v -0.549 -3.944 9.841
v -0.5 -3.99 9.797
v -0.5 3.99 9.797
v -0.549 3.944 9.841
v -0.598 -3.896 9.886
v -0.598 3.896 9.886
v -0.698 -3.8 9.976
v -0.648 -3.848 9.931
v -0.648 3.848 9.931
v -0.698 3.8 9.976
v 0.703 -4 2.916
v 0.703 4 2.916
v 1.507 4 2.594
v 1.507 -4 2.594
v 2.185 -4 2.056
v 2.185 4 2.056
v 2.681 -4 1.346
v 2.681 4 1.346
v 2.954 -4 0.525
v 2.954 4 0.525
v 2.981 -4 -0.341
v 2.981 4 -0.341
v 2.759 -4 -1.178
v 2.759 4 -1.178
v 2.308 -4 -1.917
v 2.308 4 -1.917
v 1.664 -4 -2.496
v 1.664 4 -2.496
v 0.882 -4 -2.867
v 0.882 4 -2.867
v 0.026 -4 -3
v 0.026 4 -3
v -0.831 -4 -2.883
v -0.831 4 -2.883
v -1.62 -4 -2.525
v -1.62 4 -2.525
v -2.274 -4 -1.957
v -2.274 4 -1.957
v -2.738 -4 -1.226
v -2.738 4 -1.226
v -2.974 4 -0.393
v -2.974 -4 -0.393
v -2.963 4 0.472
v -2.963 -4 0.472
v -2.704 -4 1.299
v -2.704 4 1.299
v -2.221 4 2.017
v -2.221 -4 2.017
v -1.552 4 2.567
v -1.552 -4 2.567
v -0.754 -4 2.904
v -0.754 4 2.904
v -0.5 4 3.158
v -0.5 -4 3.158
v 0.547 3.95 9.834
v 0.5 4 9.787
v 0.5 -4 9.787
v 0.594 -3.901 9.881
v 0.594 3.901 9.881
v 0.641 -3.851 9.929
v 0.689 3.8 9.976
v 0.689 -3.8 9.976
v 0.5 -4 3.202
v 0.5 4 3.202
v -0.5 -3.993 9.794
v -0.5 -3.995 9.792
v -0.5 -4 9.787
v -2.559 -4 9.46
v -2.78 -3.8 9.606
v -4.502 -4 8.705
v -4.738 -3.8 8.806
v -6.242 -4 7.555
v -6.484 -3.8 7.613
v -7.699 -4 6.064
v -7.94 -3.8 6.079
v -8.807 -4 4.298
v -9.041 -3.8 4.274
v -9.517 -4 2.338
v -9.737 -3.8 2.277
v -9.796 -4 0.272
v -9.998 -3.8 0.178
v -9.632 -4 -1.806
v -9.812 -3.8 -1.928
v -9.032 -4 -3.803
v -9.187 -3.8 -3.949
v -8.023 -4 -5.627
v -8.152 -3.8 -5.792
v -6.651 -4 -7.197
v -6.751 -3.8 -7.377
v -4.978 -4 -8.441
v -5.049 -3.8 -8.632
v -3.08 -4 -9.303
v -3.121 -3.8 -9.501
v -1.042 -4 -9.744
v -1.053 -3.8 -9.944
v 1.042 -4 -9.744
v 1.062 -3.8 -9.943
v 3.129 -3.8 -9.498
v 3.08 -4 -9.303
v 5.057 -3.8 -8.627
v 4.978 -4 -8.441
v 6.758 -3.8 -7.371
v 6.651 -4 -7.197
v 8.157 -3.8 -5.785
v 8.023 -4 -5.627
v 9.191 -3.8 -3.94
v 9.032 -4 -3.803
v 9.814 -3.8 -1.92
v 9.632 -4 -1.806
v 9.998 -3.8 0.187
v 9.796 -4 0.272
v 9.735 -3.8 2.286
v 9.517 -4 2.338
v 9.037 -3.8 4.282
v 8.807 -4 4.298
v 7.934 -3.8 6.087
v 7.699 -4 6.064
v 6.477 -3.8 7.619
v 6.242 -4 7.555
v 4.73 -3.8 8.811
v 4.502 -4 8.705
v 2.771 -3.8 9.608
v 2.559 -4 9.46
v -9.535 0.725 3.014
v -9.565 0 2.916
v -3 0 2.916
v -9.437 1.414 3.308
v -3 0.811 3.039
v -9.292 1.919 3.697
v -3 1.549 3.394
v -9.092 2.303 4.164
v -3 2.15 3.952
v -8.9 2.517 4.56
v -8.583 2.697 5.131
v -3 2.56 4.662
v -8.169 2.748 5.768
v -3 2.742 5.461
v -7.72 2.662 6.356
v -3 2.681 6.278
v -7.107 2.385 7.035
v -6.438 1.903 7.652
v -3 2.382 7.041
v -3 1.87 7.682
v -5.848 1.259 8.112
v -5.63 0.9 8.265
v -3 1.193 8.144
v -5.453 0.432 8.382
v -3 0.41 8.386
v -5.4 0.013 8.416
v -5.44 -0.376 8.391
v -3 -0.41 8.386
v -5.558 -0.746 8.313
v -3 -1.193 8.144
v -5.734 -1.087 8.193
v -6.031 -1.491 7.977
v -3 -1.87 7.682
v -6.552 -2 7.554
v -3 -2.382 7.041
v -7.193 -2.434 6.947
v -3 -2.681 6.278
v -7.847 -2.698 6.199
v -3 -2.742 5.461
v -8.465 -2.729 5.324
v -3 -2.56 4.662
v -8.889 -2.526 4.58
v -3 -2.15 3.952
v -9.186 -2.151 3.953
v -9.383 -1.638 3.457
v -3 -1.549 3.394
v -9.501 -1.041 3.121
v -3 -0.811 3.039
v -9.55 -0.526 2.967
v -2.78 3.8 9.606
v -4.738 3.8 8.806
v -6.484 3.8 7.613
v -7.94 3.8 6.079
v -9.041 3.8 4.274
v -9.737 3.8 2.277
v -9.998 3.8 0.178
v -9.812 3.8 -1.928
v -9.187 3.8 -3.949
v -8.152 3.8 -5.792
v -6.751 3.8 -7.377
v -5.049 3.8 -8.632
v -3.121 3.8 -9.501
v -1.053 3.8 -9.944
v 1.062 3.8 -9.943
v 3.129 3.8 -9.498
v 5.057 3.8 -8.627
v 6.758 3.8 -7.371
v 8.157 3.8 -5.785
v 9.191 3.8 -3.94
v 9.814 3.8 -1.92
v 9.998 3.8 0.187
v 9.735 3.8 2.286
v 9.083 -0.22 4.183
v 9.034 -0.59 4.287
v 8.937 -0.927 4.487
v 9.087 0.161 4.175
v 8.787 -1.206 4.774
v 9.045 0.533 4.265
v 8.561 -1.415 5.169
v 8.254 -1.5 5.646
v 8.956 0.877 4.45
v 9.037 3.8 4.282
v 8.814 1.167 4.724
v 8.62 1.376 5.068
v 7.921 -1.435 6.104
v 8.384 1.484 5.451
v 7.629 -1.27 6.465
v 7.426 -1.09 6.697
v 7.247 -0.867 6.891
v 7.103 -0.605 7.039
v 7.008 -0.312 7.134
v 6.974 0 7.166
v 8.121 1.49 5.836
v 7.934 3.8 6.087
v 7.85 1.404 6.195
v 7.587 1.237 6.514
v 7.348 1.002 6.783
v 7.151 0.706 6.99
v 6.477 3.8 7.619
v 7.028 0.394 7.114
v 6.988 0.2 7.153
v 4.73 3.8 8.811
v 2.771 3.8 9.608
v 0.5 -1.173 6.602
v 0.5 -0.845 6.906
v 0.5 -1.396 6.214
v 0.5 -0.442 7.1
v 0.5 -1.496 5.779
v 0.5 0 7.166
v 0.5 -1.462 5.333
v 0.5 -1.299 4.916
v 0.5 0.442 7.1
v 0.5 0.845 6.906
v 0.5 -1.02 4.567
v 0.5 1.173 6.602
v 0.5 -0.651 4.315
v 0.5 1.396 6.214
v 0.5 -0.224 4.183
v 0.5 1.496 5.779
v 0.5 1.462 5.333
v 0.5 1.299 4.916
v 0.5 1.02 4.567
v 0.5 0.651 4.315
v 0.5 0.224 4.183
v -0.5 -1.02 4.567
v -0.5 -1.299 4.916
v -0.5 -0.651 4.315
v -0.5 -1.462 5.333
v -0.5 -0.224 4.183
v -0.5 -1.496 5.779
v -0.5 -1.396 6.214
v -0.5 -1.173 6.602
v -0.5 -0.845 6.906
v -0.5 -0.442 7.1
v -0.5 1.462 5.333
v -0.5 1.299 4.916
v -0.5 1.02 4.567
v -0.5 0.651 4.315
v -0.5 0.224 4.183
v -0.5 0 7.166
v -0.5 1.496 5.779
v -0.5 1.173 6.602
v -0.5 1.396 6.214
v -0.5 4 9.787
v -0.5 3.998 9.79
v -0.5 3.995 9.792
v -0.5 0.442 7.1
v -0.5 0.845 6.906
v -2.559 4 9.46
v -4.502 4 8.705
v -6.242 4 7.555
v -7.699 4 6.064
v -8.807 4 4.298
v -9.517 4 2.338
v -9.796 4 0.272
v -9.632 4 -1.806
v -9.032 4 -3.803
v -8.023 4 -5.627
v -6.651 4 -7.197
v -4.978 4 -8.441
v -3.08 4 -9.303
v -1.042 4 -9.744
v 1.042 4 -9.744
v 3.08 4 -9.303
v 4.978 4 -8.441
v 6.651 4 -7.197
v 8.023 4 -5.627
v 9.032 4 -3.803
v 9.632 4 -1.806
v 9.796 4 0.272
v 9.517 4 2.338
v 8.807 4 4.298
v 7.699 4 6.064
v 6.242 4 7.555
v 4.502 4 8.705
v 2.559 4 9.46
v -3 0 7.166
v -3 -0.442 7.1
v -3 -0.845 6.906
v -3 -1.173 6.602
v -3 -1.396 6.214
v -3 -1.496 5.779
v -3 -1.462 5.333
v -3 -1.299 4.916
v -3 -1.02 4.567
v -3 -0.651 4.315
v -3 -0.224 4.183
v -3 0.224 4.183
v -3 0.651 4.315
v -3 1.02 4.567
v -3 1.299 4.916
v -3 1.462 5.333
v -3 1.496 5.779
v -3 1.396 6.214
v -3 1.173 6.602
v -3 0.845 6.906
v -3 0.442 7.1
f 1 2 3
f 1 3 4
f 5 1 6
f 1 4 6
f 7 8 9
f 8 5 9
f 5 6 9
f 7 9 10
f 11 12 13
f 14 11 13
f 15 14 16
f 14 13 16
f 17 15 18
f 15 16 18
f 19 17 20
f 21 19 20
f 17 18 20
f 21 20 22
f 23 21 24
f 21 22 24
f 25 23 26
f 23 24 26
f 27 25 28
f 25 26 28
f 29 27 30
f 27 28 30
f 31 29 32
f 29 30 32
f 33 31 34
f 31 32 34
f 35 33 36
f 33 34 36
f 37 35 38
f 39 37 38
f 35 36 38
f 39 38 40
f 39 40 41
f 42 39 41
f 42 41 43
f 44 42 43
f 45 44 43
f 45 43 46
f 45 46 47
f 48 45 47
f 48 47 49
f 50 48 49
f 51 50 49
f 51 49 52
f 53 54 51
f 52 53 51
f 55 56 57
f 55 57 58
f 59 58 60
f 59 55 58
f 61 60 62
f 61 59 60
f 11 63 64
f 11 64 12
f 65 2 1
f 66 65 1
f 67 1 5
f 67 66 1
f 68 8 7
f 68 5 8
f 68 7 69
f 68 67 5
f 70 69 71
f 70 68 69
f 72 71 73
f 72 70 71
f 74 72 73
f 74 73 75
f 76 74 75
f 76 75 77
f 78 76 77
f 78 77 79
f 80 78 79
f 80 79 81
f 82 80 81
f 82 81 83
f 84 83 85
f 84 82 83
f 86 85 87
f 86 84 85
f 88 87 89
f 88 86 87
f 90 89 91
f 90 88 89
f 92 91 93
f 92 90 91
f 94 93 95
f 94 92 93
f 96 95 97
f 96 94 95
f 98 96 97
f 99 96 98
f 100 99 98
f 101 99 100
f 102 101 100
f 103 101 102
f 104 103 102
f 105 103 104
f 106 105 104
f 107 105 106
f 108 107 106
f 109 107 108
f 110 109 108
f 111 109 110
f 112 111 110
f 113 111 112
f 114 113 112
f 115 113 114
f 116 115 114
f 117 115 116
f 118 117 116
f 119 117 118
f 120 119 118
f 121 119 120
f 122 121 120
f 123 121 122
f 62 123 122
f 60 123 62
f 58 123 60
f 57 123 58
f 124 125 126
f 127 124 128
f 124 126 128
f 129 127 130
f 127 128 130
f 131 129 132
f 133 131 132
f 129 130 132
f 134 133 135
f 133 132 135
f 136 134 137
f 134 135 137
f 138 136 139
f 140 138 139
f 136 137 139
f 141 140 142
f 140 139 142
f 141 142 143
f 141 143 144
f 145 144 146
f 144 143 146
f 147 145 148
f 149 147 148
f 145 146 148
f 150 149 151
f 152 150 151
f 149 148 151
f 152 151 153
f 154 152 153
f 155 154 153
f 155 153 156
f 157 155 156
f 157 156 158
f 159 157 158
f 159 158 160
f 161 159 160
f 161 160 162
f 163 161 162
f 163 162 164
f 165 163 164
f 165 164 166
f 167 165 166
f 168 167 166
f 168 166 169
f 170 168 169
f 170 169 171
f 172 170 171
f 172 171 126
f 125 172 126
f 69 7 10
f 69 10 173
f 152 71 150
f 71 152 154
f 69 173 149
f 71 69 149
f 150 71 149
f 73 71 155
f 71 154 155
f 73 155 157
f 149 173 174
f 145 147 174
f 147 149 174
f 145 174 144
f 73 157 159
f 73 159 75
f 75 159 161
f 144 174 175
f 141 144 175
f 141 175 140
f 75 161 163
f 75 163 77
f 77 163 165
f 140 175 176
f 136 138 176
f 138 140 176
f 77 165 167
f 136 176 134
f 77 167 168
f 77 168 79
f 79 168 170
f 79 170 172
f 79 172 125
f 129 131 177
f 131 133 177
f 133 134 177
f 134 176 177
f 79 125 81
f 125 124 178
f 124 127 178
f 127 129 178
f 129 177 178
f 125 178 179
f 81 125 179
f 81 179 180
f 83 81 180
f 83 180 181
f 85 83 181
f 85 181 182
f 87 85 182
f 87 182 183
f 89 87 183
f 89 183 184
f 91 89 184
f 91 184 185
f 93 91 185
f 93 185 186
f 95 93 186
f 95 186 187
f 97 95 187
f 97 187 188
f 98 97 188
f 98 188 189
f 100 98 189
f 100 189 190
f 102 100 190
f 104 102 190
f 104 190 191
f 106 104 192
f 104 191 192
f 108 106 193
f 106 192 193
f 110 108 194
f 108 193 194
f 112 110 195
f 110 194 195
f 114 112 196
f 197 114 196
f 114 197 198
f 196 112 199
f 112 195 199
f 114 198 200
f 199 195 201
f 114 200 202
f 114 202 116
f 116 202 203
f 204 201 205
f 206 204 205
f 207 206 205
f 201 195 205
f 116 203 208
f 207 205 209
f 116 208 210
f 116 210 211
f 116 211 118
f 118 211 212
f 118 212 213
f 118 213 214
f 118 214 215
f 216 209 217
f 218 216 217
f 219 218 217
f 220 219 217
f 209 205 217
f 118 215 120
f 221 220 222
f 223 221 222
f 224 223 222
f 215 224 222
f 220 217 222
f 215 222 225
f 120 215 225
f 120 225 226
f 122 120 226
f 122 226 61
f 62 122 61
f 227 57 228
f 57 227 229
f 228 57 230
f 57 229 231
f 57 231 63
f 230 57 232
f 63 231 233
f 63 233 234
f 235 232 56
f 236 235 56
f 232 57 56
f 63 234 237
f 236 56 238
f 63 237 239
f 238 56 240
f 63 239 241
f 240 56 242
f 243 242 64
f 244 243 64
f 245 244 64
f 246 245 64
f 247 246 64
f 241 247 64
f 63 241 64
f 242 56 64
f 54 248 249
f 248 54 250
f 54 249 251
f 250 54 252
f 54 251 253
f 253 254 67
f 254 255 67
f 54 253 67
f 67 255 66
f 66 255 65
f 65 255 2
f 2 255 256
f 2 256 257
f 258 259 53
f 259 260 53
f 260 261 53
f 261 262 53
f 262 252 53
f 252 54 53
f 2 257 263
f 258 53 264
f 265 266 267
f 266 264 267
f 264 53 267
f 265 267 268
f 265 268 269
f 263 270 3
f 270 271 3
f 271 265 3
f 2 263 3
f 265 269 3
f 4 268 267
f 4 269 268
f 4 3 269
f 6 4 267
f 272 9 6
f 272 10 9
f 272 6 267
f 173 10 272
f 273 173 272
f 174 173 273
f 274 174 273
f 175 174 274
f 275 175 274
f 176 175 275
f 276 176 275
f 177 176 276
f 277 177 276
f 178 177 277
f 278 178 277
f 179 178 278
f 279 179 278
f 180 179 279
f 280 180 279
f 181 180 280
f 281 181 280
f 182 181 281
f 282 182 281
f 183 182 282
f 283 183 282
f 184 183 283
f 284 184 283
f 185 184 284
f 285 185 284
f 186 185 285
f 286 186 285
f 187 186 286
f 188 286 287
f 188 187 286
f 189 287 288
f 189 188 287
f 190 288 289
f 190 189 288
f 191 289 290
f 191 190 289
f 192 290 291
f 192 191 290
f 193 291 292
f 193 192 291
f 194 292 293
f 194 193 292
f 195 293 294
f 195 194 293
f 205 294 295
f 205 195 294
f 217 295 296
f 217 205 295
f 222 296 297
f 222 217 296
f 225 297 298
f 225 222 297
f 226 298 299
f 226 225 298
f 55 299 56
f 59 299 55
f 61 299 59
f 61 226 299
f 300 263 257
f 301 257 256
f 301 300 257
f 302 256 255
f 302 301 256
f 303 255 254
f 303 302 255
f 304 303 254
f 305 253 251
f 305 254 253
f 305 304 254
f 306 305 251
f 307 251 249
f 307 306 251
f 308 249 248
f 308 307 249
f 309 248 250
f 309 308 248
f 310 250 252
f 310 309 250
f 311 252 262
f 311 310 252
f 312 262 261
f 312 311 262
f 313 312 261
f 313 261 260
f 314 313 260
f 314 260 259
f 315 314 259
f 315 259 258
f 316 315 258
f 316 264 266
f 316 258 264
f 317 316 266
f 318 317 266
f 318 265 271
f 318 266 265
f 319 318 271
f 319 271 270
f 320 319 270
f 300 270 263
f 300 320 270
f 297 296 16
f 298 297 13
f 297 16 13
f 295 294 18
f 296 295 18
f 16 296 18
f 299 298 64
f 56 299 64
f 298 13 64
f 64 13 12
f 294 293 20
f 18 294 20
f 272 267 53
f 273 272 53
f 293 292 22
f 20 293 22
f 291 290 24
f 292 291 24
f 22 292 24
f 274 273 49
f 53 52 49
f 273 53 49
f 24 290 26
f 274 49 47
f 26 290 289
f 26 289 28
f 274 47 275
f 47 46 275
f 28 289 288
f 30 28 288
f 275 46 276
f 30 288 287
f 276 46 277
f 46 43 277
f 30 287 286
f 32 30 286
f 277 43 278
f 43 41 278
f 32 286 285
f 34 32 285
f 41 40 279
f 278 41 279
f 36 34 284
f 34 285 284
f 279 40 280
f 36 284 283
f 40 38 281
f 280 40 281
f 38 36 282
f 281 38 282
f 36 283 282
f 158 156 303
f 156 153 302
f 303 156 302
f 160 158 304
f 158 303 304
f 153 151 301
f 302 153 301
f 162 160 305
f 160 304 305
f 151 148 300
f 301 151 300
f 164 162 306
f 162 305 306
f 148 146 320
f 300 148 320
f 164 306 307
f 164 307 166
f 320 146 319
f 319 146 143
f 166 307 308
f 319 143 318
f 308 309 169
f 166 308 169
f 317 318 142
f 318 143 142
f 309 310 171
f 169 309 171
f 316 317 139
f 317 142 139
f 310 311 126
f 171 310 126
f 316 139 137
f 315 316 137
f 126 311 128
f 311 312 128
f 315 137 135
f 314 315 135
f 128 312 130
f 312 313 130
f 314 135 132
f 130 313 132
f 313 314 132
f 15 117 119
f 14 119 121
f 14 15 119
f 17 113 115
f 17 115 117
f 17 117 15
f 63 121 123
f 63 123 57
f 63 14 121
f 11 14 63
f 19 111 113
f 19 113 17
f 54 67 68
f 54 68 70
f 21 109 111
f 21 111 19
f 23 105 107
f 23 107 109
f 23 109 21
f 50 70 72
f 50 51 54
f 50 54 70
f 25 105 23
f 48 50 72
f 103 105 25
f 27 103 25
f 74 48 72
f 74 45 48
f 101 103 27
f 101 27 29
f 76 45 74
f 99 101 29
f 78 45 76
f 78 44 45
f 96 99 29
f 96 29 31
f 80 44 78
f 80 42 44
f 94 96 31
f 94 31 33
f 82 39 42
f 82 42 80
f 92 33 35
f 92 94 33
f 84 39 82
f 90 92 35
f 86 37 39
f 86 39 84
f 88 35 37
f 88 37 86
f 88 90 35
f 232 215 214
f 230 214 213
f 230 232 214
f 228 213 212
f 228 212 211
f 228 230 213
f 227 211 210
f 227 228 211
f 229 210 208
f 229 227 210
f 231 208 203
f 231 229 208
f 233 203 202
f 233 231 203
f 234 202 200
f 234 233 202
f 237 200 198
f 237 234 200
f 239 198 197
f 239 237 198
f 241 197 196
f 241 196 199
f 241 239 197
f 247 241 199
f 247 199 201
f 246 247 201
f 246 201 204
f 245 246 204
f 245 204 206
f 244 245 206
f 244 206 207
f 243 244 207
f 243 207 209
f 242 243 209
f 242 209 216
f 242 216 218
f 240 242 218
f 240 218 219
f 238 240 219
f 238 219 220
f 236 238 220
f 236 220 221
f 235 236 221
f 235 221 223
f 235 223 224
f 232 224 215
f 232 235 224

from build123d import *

# Parameters (mm, degrees)
EXTRUDE_1_DEPTH     = 4
CHAMFER_1_SIZE      = 0.2
CHAMFER_1_SIZE_2    = 0.19070336
CHAMFER_1_SIZE_3    = 0.244096934
SKETCH_2_R          = 2.75
CUT_EXTRUDE_1_DEPTH = 17.881943016
SKETCH_3_R          = 1.5
CUT_EXTRUDE_2_DEPTH = 17.881943152


with BuildPart() as part:
    # 草图1 → 凸台-拉伸1 (new, symmetric)
    with BuildSketch(Plane(origin=(0, 0, 0), x_dir=(1, 0, 0), z_dir=(0, 1, 0))):
        with BuildLine():
            Line((-0.5, -2.958039892), (-0.5, -9.987492178))
            ThreePointArc((-0.5, -9.987492178), (0, 10), (0.5, -9.987492178))
            Line((0.5, -9.987492178), (0.5, -2.958039892))
            ThreePointArc((0.5, -2.958039892), (0, 3), (-0.5, -2.958039892))
        make_face()
    extrude(amount=EXTRUDE_1_DEPTH, both=True)

    # 倒角1
    # the kernel refuses this chamfer: 0.244096934, 0.2, 0.19070336 mm, written as the material it takes off along each edge
    with BuildSketch(Plane(origin=(0, 4, 0), x_dir=(-0.0031415874858795653, 0, 0.9999950652018581), z_dir=(0.9999950652018581, 0, 0.0031415874858795653))) as chamfer_1_piece_1:
        Polygon((10 - CHAMFER_1_SIZE, 0), (10, CHAMFER_1_SIZE), (10, 0), align=None)
    revolve(axis=Axis((0, 4, 0), (0, -1, 0)), revolution_arc=359.64, mode=Mode.SUBTRACT)
    with BuildSketch(Plane(origin=(0, -4, 0), x_dir=(-0.0031415874858795653, 0, 0.9999950652018581), z_dir=(0.9999950652018581, 0, 0.0031415874858795653))) as chamfer_1_piece_2:
        Polygon((10, -CHAMFER_1_SIZE), (10 - CHAMFER_1_SIZE, 0), (10, 0), align=None)
    revolve(axis=Axis((0, -4, 0), (0, -1, 0)), revolution_arc=359.64, mode=Mode.SUBTRACT)
    with BuildSketch(Plane(origin=(-0.5, -4.671168093, 2.958039892), x_dir=(0, 0, 1), z_dir=(0, 1, 0))) as chamfer_1_piece_3:
        with BuildLine():
            Line((CHAMFER_1_SIZE, 0), (-0.054456761, -0.254456761))
            ThreePointArc((-0.054456761, -0.254456761), (-0.025330071, -0.131833133), (0, 0))
            Line((0, 0), (CHAMFER_1_SIZE, 0))
        make_face()
    extrude(amount=9.342336186, mode=Mode.SUBTRACT)
    with BuildSketch(Plane(origin=(-0.5, 4.50932304, 9.987492178), x_dir=(0, 0, -1), z_dir=(0, -1, 0))) as chamfer_1_piece_4:
        with BuildLine():
            Line((CHAMFER_1_SIZE_2 * 1.00000000187, 0), (0.01186065, -0.197693077))
            ThreePointArc((0.01186065, -0.197693077), (0.005608956, -0.101670471), (0, 0))
            Line((0, 0), (CHAMFER_1_SIZE_2 * 1.00000000187, 0))
        make_face()
    extrude(amount=9.01864608, mode=Mode.SUBTRACT)
    with BuildSketch(Plane(origin=(0.5, 4.514336598, 9.987492178), x_dir=(0, 0, -1), z_dir=(0, -1, 0))) as chamfer_1_piece_5:
        with BuildLine():
            Line((CHAMFER_1_SIZE, 0), (0.011239899, 0.188760101))
            ThreePointArc((0.011239899, 0.188760101), (0.005331916, 0.097056531), (0, 0))
            Line((0, 0), (CHAMFER_1_SIZE, 0))
        make_face()
    extrude(amount=9.028673195, mode=Mode.SUBTRACT)
    with BuildSketch(Plane(origin=(0.5, -4.630296565, 2.958039892), x_dir=(0, 0, 1), z_dir=(0, 1, 0))) as chamfer_1_piece_6:
        with BuildLine():
            Line((CHAMFER_1_SIZE_3 * 0.999999998038, 0), (-0.041587873, 0.203070142))
            ThreePointArc((-0.041587873, 0.203070142), (-0.019758938, 0.105396594), (0, 0))
            Line((0, 0), (CHAMFER_1_SIZE_3 * 0.999999998038, 0))
        make_face()
    extrude(amount=9.26059313, mode=Mode.SUBTRACT)

    # 草图2 → 切除-拉伸1 (cut, through all)
    with BuildSketch(Plane(origin=(-3, 0, 0), x_dir=(0, 0, -1), z_dir=(1, 0, 0))):
        with Locations((-5.666452018, 0)):
            Circle(SKETCH_2_R)
    extrude(amount=-CUT_EXTRUDE_1_DEPTH, mode=Mode.SUBTRACT)

    # 草图3 → 切除-拉伸2 (cut, through all)
    with BuildSketch(Plane(origin=(-3, 0, 0), x_dir=(0, 0, -1), z_dir=(1, 0, 0))):
        with Locations(Location((-5.666452018, 0, 0), (0, 0, 180))):
            Circle(SKETCH_3_R)
    extrude(amount=CUT_EXTRUDE_2_DEPTH, mode=Mode.SUBTRACT)


solid = part.part
